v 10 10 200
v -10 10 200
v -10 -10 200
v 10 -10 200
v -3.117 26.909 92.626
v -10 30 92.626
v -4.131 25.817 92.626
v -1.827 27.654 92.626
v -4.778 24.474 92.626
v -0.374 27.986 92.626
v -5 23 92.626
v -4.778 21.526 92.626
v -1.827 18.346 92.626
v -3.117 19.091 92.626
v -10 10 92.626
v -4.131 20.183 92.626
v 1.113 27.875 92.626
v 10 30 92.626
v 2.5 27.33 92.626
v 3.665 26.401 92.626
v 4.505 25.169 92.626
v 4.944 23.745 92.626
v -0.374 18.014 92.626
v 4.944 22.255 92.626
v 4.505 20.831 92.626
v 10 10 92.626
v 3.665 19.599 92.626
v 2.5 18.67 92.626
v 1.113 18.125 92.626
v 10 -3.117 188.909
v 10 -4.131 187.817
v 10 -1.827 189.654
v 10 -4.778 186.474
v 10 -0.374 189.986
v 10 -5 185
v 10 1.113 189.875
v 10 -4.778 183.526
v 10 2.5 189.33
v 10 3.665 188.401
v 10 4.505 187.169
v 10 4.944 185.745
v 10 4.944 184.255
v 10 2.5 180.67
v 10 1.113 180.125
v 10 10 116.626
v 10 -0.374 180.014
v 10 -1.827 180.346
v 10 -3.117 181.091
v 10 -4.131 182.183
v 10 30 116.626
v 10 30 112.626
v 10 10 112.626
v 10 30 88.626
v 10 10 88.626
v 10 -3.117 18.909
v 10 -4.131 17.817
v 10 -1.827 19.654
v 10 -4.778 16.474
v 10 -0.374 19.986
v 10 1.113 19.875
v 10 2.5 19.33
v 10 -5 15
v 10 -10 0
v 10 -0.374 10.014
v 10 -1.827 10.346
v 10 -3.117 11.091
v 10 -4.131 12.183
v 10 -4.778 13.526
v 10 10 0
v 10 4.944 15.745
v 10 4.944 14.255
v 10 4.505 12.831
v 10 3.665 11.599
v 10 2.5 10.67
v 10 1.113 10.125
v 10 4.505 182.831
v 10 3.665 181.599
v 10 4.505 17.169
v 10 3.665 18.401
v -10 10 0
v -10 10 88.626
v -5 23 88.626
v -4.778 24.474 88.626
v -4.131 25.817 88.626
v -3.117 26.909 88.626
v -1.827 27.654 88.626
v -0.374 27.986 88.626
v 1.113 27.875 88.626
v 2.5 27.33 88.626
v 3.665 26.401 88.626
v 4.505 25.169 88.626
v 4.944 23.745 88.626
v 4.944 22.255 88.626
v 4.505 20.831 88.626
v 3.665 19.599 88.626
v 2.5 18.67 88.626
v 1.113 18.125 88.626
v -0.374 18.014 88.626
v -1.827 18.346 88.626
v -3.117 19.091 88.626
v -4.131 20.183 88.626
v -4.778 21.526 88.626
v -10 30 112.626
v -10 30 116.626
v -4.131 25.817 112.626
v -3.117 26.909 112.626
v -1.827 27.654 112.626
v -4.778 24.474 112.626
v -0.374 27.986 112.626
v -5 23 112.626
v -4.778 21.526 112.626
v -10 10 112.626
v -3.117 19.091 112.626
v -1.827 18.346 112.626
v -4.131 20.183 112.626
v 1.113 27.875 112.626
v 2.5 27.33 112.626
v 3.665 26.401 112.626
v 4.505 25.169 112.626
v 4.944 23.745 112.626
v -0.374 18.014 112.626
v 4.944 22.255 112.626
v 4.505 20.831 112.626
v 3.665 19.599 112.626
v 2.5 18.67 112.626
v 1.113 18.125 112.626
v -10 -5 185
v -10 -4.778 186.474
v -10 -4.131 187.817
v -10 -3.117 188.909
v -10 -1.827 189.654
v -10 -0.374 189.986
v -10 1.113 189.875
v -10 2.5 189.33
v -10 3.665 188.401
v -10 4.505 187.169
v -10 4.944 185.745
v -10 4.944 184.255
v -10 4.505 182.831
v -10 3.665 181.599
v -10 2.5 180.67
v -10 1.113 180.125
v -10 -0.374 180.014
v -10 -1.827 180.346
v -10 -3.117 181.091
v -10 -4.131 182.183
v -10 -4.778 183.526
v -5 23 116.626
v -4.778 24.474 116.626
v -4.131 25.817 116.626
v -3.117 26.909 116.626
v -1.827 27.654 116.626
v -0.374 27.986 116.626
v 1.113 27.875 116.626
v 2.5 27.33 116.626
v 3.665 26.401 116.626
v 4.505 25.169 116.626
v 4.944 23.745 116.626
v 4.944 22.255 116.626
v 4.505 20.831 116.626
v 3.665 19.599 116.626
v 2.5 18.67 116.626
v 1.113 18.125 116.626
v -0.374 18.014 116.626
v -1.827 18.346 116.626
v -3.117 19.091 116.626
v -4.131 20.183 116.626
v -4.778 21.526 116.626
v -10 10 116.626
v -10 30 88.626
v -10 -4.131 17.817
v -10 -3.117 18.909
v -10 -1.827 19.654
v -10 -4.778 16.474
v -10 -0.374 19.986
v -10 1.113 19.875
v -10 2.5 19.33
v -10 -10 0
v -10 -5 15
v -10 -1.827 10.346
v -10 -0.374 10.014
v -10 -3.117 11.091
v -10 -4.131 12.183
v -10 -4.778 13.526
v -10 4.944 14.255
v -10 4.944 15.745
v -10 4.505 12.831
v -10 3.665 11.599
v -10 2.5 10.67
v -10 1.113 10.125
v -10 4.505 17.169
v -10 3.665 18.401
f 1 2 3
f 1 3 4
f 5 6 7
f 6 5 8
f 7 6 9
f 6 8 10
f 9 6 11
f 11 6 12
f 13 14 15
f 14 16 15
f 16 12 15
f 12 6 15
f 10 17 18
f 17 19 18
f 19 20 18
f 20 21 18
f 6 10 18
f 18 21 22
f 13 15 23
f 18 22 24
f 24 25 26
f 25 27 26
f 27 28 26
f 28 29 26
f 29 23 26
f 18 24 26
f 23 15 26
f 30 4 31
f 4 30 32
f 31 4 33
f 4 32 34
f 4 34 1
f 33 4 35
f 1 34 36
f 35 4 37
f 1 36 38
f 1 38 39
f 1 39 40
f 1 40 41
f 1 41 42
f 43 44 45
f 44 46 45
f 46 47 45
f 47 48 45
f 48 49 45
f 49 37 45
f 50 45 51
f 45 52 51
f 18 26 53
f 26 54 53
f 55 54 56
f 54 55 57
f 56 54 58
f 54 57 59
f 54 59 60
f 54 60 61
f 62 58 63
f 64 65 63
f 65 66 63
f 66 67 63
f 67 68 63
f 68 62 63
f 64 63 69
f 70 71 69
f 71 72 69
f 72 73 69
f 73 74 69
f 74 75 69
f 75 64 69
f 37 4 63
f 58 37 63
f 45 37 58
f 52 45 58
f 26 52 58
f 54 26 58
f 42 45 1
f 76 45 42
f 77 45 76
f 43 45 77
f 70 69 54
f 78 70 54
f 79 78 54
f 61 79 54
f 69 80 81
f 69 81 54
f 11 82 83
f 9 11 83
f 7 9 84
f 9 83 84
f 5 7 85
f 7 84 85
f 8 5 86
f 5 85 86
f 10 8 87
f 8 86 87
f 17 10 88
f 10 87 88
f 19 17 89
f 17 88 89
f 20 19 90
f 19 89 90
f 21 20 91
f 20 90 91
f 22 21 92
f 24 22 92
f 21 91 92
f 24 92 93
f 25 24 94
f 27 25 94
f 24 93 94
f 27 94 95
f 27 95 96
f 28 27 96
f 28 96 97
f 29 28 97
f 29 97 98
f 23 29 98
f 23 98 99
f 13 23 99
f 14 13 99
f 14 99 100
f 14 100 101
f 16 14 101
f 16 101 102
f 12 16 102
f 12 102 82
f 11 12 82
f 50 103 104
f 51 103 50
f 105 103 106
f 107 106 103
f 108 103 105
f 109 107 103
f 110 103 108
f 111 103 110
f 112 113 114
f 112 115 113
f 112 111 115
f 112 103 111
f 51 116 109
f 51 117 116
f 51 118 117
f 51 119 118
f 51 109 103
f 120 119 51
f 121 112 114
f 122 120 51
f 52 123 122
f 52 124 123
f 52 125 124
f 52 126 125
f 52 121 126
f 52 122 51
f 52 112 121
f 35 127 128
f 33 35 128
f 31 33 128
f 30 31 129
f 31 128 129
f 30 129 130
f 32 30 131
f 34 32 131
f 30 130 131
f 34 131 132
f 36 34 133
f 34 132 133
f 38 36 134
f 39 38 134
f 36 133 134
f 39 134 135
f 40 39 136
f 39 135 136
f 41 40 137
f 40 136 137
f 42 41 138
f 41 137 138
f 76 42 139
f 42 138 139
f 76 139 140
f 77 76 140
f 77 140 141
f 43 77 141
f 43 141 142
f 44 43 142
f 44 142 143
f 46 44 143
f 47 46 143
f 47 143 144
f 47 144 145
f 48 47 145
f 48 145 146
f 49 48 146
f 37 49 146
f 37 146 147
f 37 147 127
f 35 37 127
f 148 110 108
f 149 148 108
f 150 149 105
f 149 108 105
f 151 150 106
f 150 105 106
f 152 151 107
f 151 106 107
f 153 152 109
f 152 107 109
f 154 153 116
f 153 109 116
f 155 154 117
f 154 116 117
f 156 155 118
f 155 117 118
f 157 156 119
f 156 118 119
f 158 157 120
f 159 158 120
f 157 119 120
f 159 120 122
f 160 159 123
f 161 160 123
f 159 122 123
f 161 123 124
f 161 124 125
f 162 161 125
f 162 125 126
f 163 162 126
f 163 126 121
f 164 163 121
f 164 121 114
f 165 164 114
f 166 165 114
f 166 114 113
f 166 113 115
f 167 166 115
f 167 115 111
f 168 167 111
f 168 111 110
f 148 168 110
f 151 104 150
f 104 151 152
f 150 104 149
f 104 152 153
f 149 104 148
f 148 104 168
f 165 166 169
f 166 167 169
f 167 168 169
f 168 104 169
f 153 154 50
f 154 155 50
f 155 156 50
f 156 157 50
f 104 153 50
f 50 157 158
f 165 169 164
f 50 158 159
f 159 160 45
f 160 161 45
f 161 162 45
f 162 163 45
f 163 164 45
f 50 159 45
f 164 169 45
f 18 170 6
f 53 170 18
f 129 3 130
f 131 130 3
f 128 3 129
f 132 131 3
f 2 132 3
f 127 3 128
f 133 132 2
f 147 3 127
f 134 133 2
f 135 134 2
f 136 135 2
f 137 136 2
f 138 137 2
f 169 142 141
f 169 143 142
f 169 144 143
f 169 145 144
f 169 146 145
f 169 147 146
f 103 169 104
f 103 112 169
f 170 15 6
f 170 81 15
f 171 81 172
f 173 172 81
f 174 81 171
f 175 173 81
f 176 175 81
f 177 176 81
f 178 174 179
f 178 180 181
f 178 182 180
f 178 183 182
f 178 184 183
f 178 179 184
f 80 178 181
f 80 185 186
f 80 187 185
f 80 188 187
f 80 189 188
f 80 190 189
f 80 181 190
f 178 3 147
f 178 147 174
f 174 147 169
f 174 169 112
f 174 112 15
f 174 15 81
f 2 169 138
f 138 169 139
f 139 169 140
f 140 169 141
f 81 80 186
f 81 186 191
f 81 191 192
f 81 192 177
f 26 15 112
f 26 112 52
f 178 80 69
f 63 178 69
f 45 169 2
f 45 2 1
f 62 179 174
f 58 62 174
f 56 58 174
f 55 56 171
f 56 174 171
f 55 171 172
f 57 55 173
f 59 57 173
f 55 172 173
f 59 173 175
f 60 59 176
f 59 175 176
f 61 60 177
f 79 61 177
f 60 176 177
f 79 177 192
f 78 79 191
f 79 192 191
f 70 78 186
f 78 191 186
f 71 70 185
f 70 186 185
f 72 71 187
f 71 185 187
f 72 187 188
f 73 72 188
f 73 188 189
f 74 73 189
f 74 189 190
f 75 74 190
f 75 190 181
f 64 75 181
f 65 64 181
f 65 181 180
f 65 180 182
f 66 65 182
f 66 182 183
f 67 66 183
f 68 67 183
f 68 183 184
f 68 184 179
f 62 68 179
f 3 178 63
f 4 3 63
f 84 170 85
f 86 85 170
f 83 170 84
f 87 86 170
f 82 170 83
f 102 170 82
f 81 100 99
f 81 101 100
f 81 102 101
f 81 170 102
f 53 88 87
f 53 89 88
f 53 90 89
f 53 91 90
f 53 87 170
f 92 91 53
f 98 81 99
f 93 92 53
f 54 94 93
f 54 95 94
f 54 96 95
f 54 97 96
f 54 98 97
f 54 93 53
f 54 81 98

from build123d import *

# Parameters (mm, degrees)
SKETCH1_W           = 20
SKETCH1_H           = 20
BOSS_EXTRUDE1_DEPTH = 200
SKETCH3_R           = 5
CUT_EXTRUDE1_DEPTH  = 57
SKETCH4_W           = 20
SKETCH4_H           = 4
BOSS_EXTRUDE2_DEPTH = 20
SKETCH5_R           = 5
CUT_EXTRUDE2_DEPTH  = 49


with BuildPart() as part:
    # Sketch1 → Boss-Extrude1 (new body)
    with BuildSketch(Plane.XY):
        Rectangle(SKETCH1_W, SKETCH1_H)
    extrude(amount=BOSS_EXTRUDE1_DEPTH)

    # Sketch3 → Cut-Extrude1 (cut)
    with BuildSketch(Plane.ZY.offset(10)):
        with Locations(Location((15, 0, 0), (0, 0, 270))):
            Circle(SKETCH3_R)
        with Locations(Location((185, 0, 0), (0, 0, 270))):
            Circle(SKETCH3_R)
    extrude(amount=-CUT_EXTRUDE1_DEPTH, mode=Mode.SUBTRACT)

    # Sketch4 → Boss-Extrude2 (add)
    with BuildSketch(Plane(origin=(0, 10, 0), x_dir=(1, 0, 0), z_dir=(0, 1, 0))):
        with Locations((0, -114.625901795)):
            Rectangle(SKETCH4_W, SKETCH4_H)
        with Locations((0, -90.625901795)):
            Rectangle(SKETCH4_W, SKETCH4_H)
    extrude(amount=BOSS_EXTRUDE2_DEPTH)

    # Sketch5 → Cut-Extrude2 (cut)
    with BuildSketch(Plane(origin=(0, 0, 88.625901795), x_dir=(-1, 0, 0), z_dir=(0, 0, -1))):
        with Locations((0, 23)):
            Circle(SKETCH5_R)
    extrude(amount=-CUT_EXTRUDE2_DEPTH, mode=Mode.SUBTRACT)


solid = part.part
